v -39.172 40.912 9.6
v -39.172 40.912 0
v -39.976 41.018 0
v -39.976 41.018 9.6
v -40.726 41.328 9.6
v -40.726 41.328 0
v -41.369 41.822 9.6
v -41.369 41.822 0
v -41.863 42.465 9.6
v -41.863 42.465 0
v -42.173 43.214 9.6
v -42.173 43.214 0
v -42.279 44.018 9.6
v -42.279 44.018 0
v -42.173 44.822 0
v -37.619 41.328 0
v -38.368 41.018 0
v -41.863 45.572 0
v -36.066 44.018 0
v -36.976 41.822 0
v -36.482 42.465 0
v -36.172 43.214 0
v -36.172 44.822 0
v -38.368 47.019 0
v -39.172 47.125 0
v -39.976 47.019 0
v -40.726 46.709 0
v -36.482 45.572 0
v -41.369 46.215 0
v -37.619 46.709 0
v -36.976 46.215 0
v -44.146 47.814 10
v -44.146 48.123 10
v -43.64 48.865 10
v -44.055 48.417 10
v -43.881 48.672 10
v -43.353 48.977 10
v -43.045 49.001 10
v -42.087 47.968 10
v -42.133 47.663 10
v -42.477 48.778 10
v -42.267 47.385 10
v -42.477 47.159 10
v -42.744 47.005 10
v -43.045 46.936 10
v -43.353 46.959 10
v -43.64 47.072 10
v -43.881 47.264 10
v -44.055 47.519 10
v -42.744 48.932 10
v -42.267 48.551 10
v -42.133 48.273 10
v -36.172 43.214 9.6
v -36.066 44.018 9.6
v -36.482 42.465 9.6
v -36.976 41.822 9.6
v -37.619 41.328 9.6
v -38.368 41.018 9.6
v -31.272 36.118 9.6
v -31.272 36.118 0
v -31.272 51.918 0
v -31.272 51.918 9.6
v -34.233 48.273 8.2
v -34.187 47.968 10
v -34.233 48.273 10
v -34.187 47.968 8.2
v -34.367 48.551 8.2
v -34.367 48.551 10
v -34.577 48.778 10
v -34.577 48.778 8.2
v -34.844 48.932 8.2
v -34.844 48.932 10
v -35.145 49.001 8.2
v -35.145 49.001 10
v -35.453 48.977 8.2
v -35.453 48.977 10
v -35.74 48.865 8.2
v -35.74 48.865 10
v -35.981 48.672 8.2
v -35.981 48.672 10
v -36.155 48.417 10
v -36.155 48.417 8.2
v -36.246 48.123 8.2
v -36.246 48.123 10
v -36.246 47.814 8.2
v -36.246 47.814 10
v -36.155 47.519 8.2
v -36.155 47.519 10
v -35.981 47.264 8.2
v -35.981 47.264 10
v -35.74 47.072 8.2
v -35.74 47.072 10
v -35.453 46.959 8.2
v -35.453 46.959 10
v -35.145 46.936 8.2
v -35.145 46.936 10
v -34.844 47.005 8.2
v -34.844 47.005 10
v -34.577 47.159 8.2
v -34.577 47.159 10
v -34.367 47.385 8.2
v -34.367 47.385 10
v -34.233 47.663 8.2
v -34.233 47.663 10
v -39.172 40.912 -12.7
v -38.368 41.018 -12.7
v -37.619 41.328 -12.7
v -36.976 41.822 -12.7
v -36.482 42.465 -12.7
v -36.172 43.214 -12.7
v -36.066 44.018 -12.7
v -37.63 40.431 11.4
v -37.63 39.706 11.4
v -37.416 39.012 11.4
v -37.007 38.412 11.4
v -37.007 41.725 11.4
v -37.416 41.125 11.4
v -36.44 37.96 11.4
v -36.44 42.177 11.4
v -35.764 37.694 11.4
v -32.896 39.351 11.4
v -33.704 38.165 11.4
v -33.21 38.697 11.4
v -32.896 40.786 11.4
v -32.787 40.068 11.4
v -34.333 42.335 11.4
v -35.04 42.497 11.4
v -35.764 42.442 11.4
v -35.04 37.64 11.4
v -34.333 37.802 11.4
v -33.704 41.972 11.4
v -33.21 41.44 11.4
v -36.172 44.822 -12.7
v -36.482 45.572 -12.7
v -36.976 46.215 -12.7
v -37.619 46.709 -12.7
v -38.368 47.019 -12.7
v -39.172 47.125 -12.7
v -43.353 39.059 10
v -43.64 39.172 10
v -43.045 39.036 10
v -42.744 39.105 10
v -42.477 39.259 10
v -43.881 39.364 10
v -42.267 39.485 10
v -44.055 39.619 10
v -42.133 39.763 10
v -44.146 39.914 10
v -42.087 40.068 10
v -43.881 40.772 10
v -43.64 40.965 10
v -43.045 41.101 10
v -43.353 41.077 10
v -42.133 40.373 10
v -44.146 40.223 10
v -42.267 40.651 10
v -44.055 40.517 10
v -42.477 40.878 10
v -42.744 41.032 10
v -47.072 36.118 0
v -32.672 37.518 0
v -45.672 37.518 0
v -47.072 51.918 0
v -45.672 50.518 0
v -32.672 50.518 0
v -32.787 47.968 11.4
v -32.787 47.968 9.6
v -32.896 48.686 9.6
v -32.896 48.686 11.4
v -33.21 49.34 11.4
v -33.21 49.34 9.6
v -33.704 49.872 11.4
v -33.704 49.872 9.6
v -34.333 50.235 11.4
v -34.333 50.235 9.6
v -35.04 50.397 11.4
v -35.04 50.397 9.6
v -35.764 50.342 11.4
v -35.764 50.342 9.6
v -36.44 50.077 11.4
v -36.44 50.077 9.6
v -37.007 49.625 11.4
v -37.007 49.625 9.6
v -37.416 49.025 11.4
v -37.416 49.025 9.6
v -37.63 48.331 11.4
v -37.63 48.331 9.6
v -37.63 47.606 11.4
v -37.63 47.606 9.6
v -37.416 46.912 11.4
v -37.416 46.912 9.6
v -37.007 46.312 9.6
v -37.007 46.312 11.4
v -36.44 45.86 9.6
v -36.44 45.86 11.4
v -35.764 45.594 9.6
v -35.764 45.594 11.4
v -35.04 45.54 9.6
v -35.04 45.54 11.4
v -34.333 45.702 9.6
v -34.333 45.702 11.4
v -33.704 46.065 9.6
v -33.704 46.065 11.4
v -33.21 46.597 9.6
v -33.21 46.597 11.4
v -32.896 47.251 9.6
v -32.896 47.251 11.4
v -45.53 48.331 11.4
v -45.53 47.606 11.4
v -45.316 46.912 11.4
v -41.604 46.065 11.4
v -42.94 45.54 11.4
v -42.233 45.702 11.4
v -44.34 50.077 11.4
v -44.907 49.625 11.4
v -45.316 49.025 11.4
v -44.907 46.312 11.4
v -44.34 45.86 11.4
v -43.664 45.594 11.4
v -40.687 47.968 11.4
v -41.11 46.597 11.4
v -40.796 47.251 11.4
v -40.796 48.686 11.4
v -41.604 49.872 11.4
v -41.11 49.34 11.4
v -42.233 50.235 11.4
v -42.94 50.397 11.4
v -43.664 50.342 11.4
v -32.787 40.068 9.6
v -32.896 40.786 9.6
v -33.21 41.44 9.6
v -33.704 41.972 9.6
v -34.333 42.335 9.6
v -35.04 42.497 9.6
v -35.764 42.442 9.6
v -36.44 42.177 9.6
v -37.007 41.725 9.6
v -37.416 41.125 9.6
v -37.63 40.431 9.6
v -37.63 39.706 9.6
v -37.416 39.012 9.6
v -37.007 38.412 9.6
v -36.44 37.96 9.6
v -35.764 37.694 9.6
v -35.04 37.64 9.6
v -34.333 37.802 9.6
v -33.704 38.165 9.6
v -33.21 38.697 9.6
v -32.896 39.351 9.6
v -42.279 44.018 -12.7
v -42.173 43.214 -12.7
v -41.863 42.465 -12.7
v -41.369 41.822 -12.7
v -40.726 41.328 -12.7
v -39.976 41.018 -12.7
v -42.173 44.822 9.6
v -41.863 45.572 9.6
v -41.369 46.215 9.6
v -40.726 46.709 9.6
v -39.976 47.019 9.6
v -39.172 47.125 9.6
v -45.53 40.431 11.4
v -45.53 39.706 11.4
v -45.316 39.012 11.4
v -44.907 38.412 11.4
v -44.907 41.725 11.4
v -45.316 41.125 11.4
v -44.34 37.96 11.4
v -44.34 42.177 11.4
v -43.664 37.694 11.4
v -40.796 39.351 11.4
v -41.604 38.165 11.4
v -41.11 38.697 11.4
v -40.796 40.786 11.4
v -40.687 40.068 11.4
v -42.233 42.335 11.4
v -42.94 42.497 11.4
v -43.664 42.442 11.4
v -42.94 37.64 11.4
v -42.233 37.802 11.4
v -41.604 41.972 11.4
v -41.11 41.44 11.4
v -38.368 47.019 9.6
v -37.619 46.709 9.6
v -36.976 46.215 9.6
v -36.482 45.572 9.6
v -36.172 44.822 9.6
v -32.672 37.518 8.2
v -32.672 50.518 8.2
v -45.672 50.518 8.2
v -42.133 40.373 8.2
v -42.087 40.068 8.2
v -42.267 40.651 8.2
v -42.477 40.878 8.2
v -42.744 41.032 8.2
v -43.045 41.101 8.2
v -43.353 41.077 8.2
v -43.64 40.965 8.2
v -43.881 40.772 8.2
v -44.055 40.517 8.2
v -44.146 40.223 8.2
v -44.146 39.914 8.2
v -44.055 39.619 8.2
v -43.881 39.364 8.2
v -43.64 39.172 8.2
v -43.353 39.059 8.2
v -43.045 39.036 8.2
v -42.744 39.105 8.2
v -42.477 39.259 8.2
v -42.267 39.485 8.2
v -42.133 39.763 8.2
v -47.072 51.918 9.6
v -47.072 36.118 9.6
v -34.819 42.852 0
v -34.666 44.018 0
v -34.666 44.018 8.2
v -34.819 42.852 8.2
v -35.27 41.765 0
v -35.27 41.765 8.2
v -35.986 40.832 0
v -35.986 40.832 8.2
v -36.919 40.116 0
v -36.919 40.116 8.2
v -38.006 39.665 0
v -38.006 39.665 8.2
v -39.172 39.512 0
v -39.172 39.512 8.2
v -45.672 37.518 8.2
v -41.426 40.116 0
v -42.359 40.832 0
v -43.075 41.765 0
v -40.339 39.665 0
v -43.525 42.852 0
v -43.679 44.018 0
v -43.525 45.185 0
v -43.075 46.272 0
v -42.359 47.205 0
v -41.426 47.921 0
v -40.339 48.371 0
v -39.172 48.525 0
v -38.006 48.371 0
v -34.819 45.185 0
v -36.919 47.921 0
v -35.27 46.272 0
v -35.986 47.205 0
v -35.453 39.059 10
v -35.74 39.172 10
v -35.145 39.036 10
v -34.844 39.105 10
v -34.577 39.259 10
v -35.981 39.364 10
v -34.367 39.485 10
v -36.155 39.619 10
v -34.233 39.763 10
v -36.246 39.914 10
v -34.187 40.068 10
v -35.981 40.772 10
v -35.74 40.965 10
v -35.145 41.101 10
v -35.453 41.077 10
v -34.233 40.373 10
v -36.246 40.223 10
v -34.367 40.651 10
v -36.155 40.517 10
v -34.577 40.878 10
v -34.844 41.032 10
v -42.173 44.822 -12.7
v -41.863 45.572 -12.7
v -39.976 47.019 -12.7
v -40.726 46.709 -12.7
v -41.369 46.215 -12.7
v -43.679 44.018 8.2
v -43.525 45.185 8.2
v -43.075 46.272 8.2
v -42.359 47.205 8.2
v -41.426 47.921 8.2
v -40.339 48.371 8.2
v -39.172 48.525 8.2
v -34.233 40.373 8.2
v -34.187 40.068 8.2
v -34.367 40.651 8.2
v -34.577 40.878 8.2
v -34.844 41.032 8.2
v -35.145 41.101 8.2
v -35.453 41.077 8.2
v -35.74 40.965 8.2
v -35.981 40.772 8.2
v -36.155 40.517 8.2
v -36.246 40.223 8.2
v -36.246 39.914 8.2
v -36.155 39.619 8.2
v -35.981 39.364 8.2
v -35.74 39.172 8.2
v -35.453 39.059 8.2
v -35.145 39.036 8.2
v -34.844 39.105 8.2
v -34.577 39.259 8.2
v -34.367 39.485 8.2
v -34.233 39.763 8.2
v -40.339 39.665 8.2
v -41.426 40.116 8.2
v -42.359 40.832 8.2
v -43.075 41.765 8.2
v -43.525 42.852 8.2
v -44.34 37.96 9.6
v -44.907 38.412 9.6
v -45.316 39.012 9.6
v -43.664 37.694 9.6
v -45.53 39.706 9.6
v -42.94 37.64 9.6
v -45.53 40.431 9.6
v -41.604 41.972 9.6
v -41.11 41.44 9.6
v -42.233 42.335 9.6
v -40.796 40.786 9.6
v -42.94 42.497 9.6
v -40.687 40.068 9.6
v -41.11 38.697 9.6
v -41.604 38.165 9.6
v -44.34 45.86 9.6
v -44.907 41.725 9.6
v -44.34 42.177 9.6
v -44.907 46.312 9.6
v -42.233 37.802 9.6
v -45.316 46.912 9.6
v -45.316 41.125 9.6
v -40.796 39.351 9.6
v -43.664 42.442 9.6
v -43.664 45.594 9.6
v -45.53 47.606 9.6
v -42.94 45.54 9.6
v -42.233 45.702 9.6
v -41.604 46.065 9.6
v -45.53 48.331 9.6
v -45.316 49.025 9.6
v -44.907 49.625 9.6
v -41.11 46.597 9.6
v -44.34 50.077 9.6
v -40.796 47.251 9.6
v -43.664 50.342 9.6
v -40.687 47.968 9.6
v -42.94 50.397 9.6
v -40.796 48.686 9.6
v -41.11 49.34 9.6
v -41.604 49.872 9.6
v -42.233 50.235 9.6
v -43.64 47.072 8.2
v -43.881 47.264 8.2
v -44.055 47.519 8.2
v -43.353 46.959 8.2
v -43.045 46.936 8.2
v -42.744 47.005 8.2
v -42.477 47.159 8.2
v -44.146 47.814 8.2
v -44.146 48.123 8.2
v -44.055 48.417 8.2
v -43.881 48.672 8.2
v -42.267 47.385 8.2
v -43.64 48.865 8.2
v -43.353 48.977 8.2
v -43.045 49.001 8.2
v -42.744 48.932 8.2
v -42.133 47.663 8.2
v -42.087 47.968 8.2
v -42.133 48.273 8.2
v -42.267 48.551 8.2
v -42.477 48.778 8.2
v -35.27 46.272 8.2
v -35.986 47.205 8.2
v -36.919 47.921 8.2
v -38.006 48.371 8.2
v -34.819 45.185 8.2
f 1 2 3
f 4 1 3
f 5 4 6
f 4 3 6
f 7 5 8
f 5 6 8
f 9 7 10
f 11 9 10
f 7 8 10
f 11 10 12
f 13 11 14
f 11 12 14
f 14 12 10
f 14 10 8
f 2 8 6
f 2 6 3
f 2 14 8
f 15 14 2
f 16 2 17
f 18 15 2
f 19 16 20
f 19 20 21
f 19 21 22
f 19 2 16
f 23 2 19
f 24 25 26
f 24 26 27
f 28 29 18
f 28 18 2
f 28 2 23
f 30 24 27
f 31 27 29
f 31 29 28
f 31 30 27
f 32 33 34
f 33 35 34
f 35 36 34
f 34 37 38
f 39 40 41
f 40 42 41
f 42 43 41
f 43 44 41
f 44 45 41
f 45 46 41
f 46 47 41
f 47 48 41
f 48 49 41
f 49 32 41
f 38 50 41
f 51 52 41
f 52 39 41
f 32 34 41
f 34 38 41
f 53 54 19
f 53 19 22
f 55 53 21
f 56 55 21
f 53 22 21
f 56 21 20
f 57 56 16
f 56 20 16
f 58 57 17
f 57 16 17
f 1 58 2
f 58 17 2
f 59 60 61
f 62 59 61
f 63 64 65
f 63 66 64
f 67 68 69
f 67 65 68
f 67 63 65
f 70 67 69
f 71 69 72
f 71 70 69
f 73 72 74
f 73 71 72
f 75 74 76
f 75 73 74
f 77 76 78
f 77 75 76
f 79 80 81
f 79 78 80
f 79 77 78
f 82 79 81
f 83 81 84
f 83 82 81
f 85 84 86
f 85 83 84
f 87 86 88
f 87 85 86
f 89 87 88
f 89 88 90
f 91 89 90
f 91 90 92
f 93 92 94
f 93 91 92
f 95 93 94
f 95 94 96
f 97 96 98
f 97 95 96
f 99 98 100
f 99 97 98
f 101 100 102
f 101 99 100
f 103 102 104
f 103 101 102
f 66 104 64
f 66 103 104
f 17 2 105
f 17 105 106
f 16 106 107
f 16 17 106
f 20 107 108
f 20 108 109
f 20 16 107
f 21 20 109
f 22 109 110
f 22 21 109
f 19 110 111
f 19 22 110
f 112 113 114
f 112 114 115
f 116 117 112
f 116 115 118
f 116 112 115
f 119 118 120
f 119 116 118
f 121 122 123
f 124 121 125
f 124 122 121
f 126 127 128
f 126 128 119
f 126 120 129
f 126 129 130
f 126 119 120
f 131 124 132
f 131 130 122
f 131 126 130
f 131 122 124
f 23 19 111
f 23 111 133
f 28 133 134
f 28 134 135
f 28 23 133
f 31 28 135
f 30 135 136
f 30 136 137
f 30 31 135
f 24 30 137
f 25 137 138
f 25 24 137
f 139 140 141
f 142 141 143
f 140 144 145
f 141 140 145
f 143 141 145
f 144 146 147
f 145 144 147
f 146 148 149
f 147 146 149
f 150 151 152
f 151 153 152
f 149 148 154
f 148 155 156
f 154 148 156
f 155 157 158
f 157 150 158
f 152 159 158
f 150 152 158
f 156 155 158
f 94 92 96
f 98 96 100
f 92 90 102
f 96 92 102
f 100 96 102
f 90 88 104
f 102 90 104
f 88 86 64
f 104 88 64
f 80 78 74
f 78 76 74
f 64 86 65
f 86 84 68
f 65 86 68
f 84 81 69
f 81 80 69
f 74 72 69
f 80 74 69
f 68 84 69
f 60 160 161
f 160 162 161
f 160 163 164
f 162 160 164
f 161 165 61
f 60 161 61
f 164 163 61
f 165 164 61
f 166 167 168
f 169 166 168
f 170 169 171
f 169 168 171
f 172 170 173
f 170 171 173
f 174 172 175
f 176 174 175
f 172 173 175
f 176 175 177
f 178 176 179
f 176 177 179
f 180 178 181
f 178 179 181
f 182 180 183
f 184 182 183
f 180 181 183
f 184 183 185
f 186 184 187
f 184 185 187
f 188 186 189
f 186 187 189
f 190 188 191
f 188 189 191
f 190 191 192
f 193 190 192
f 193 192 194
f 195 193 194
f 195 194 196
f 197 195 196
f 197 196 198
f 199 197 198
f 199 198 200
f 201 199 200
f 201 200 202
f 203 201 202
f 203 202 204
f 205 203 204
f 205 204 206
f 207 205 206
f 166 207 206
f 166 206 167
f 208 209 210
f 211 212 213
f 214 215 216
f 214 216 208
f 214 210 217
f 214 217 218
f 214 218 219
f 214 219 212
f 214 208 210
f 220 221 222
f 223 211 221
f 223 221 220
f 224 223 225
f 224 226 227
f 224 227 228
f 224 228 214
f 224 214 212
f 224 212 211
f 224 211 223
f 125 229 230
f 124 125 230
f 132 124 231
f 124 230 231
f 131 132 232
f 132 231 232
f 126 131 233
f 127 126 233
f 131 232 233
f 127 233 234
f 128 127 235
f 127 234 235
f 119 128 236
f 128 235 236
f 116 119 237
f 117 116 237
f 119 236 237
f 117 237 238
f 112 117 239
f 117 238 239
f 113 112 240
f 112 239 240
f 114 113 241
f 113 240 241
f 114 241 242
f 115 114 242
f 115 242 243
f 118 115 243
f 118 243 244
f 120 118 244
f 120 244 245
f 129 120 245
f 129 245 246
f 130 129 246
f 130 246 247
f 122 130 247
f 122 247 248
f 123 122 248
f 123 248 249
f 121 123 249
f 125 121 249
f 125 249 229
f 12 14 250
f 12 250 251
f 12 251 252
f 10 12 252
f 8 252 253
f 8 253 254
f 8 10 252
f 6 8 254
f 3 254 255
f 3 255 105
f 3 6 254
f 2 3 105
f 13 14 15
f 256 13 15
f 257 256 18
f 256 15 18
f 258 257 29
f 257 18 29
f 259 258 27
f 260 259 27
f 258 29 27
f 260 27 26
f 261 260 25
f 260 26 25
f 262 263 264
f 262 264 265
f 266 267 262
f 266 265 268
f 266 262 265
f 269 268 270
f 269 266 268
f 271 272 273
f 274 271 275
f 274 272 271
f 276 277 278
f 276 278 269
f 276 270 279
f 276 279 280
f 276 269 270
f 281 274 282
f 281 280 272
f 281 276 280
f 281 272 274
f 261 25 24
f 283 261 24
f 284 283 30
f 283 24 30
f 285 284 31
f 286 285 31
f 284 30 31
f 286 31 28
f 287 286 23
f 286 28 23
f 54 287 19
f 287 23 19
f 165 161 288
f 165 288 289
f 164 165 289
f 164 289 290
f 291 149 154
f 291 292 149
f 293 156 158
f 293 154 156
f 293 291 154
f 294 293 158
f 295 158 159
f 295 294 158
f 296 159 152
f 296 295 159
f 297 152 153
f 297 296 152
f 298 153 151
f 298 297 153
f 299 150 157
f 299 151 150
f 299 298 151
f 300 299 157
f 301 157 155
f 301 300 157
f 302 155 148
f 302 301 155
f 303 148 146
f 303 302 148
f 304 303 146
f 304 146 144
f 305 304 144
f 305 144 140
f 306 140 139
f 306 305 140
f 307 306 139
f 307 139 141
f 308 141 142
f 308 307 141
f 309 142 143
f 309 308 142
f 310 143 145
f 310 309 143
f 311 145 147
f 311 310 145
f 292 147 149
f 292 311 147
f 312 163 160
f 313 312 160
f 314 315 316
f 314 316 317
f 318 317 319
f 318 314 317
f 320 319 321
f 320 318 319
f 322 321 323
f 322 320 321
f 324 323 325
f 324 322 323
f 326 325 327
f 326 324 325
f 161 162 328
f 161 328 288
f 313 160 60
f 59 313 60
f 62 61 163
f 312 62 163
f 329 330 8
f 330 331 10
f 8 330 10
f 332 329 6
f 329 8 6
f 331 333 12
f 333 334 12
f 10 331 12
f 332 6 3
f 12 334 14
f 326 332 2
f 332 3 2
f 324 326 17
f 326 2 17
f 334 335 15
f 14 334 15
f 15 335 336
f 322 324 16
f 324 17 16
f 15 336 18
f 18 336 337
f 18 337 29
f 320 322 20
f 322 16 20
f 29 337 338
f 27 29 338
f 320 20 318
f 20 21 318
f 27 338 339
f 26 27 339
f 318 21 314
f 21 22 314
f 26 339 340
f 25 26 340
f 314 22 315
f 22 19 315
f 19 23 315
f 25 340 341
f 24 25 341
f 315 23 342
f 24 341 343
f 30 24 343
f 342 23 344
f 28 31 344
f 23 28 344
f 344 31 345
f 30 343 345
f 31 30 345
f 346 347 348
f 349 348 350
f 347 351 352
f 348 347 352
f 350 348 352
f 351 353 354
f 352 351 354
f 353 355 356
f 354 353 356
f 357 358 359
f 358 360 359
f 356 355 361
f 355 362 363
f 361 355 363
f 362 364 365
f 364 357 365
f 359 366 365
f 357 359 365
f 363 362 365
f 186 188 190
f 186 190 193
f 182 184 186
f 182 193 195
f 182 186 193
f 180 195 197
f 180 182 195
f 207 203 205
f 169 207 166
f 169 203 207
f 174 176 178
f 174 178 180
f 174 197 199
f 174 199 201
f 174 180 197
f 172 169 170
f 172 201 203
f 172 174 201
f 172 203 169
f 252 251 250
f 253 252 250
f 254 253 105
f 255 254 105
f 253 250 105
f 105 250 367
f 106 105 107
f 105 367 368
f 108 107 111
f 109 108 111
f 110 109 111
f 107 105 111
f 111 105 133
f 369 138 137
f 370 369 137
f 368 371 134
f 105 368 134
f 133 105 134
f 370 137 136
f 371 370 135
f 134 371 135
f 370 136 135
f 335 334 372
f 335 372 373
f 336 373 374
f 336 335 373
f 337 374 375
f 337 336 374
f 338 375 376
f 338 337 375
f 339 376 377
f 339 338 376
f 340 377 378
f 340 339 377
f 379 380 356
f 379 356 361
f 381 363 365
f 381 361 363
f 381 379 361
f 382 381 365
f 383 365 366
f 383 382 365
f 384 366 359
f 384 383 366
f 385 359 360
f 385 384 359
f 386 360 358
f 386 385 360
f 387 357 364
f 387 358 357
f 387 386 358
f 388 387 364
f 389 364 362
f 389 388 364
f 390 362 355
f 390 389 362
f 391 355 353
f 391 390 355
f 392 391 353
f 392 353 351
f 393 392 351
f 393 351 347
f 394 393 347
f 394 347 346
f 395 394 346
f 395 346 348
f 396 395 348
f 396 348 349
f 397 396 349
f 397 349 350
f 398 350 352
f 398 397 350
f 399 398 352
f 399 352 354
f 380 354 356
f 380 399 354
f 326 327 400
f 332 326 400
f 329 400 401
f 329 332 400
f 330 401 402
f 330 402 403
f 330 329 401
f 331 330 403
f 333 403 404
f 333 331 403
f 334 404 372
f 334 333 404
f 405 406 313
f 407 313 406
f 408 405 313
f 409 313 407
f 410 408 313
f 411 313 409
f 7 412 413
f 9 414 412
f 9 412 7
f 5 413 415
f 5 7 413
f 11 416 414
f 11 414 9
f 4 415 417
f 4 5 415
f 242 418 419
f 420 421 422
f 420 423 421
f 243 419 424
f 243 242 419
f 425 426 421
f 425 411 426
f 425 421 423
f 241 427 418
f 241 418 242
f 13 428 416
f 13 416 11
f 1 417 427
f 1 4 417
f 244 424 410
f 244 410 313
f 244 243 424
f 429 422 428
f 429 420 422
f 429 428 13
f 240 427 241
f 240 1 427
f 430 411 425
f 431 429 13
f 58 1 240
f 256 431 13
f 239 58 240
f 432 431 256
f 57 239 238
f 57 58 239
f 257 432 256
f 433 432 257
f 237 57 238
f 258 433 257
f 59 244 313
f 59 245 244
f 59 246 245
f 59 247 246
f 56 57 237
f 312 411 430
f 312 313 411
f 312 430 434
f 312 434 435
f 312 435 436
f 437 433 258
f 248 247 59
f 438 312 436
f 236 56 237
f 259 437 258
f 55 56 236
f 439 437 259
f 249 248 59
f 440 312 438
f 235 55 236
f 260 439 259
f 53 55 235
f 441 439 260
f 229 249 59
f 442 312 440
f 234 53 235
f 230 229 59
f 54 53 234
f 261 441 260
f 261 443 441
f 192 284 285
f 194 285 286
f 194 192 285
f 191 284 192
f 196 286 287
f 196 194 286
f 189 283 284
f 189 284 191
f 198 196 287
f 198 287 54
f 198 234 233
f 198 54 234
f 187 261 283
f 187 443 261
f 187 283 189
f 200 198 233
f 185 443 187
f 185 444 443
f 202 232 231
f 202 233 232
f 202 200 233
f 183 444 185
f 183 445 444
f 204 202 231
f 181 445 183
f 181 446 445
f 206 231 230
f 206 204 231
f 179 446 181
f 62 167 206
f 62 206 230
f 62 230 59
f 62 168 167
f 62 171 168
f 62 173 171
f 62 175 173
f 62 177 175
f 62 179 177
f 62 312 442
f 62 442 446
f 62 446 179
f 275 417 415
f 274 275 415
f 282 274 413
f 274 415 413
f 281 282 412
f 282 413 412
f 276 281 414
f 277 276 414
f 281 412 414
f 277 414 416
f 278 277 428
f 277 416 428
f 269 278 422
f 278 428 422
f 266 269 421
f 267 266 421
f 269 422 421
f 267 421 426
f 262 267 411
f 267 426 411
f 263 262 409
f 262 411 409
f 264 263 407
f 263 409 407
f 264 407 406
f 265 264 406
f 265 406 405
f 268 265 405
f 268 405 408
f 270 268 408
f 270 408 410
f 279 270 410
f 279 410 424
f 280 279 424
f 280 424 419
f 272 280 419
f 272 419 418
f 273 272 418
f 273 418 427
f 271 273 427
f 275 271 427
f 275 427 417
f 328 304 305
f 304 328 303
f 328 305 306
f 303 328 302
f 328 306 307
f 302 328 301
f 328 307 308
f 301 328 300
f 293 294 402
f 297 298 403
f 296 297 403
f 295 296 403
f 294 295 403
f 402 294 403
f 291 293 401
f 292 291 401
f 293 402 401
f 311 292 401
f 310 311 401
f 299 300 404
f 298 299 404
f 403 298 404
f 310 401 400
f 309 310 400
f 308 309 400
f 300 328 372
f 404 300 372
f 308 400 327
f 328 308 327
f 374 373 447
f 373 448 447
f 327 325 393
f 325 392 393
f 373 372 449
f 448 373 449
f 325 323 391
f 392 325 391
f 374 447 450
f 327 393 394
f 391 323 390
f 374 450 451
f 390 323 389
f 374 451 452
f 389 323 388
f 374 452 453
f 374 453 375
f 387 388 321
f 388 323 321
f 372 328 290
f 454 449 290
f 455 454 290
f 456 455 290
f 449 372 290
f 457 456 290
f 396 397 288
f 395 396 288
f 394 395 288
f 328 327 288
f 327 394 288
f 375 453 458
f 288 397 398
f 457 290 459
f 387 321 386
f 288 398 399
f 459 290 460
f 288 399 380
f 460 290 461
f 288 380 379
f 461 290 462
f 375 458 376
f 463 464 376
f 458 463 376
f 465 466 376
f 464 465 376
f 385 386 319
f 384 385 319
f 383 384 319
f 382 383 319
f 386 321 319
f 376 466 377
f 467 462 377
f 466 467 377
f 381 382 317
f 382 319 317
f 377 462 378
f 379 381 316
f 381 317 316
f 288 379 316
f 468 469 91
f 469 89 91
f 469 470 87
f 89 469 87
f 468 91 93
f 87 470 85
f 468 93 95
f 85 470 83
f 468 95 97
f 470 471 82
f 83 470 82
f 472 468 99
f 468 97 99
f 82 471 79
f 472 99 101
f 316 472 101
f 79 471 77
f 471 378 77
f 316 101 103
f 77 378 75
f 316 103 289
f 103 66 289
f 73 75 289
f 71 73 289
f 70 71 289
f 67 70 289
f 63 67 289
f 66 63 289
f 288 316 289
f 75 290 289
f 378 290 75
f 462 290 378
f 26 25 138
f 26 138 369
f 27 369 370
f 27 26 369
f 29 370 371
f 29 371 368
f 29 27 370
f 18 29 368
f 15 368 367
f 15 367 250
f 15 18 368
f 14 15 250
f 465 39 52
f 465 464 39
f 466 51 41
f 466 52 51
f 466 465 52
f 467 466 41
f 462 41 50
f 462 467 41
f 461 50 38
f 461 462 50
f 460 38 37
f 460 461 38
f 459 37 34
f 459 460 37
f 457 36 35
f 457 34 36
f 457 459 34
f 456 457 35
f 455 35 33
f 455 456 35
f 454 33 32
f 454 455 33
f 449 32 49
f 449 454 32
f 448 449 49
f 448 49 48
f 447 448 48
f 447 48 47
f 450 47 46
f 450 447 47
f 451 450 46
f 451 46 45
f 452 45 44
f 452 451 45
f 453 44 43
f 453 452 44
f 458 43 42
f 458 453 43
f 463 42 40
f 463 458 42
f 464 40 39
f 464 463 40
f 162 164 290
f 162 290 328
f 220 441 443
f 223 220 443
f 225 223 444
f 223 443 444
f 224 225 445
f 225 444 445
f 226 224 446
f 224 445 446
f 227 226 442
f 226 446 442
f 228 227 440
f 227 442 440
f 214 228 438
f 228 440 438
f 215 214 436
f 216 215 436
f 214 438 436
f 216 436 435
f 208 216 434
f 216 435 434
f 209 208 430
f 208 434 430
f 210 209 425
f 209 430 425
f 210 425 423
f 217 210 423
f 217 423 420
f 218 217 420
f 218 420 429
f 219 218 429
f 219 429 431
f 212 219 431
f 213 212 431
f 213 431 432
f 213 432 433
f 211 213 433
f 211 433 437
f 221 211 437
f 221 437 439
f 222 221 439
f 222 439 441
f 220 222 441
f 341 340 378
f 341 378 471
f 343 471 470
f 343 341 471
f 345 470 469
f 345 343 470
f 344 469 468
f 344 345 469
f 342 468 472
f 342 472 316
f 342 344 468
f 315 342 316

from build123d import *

# Parameters (mm, degrees)
F0_R     = 2.435
F1_DEPTH = 9.6
F2_DEPTH = 11.4
F3_T     = -1.4
F4_DEPTH = 12.7


with BuildPart() as f1:
    # F0 (on Top) → F1 (new body)
    with BuildSketch(Plane.XY):
        with BuildLine():
            Line((-47.0723696053, 44.0184217036), (-47.0723696053, 36.1184217036))
            Line((-47.0723696053, 36.1184217036), (-39.1723696053, 36.1184217036))
            Line((-39.1723696053, 36.1184217036), (-39.1723696053, 40.9119217036))
            ThreePointArc((-39.1723696053, 40.9119217036), (-41.3689968211, 41.8217944878), (-42.2788696053, 44.0184217036))
            Line((-42.2788696053, 44.0184217036), (-47.0723696053, 44.0184217036))
        make_face()
        with Locations((-43.1223696053, 40.0684217036)):
            Circle(F0_R, mode=Mode.SUBTRACT)
        with BuildLine():
            Line((-39.1723696053, 40.9119217036), (-39.1723696053, 36.1184217036))
            Line((-39.1723696053, 36.1184217036), (-31.2723696053, 36.1184217036))
            Line((-31.2723696053, 36.1184217036), (-31.2723696053, 44.0184217036))
            Line((-31.2723696053, 44.0184217036), (-36.0658696053, 44.0184217036))
            ThreePointArc((-36.0658696053, 44.0184217036), (-36.9757423895, 41.8217944878), (-39.1723696053, 40.9119217036))
        make_face()
        with Locations((-35.2223696053, 40.0684217036)):
            Circle(F0_R, mode=Mode.SUBTRACT)
        with BuildLine():
            Line((-47.0723696053, 51.9184217036), (-47.0723696053, 44.0184217036))
            Line((-47.0723696053, 44.0184217036), (-42.2788696053, 44.0184217036))
            ThreePointArc((-42.2788696053, 44.0184217036), (-41.3689968211, 46.2150489193), (-39.1723696053, 47.1249217036))
            Line((-39.1723696053, 47.1249217036), (-39.1723696053, 51.9184217036))
            Line((-39.1723696053, 51.9184217036), (-47.0723696053, 51.9184217036))
        make_face()
        with BuildLine():
            ThreePointArc((-45.5573696053, 47.9684217036), (-43.1223696053, 50.4034217036), (-40.6873696053, 47.9684217036))
            ThreePointArc((-40.6873696053, 47.9684217036), (-43.1223696053, 45.5334217036), (-45.5573696053, 47.9684217036))
        make_face(mode=Mode.SUBTRACT)
        with BuildLine():
            Line((-36.0658696053, 44.0184217036), (-31.2723696053, 44.0184217036))
            Line((-31.2723696053, 44.0184217036), (-31.2723696053, 51.9184217036))
            Line((-31.2723696053, 51.9184217036), (-39.1723696053, 51.9184217036))
            Line((-39.1723696053, 51.9184217036), (-39.1723696053, 47.1249217036))
            ThreePointArc((-39.1723696053, 47.1249217036), (-36.9757423895, 46.2150489193), (-36.0658696053, 44.0184217036))
        make_face()
        with Locations((-35.2223696053, 47.9684217036)):
            Circle(F0_R, mode=Mode.SUBTRACT)
    extrude(amount=F1_DEPTH)

    # F0 (on Top) → F2 (join)
    with BuildSketch(Plane.XY):
        with Locations((-35.2223696053, 40.0684217036)):
            Circle(F0_R)
        with Locations((-35.2223696053, 47.9684217036)):
            Circle(F0_R)
        with BuildLine():
            ThreePointArc((-45.5573696053, 47.9684217036), (-43.1223696053, 45.5334217036), (-40.6873696053, 47.9684217036))
            ThreePointArc((-40.6873696053, 47.9684217036), (-43.1223696053, 50.4034217036), (-45.5573696053, 47.9684217036))
        make_face()
        with Locations((-43.1223696053, 40.0684217036)):
            Circle(F0_R)
    extrude(amount=F2_DEPTH)

    # F3
    f3_openings = [f1.faces().sort_by_distance(p)[0] for p in [
        (-39.17237, 36.341867, 0),
    ]]
    offset(amount=F3_T, openings=f3_openings, kind=Kind.INTERSECTION)


with BuildPart() as f4:
    # F0 (on Top) → F4 (new body)
    with BuildSketch(Plane.XY):
        with BuildLine():
            ThreePointArc((-41.9788695872, 44.0184217036), (-41.1568647739, 42.033926535), (-39.1723696053, 41.2119217217))
            Line((-39.1723696053, 41.2119217217), (-39.1723696053, 44.0184217036))
            Line((-39.1723696053, 44.0184217036), (-41.9788695872, 44.0184217036))
        make_face()
        with BuildLine():
            ThreePointArc((-39.1723696053, 46.8249216855), (-41.1568647739, 46.0029168722), (-41.9788695872, 44.0184217036))
            Line((-41.9788695872, 44.0184217036), (-39.1723696053, 44.0184217036))
            Line((-39.1723696053, 44.0184217036), (-39.1723696053, 46.8249216855))
        make_face()
        with BuildLine():
            Line((-39.1723696053, 46.8249216855), (-39.1723696053, 44.0184217036))
            Line((-39.1723696053, 44.0184217036), (-36.3658696234, 44.0184217036))
            ThreePointArc((-36.3658696234, 44.0184217036), (-37.1878744367, 46.0029168722), (-39.1723696053, 46.8249216855))
        make_face()
        with BuildLine():
            Line((-39.1723696053, 44.0184217036), (-39.1723696053, 41.2119217217))
            ThreePointArc((-39.1723696053, 41.2119217217), (-37.1878744367, 42.033926535), (-36.3658696234, 44.0184217036))
            Line((-36.3658696234, 44.0184217036), (-39.1723696053, 44.0184217036))
        make_face()
        with BuildLine():
            ThreePointArc((-39.1723696053, 47.1249217036), (-41.3689968211, 46.2150489193), (-42.2788696053, 44.0184217036))
            Line((-42.2788696053, 44.0184217036), (-41.9788695872, 44.0184217036))
            ThreePointArc((-41.9788695872, 44.0184217036), (-41.1568647739, 46.0029168722), (-39.1723696053, 46.8249216855))
            Line((-39.1723696053, 46.8249216855), (-39.1723696053, 47.1249217036))
        make_face()
        with BuildLine():
            Line((-36.3658696234, 44.0184217036), (-36.0658696053, 44.0184217036))
            ThreePointArc((-36.0658696053, 44.0184217036), (-36.9757423895, 46.2150489193), (-39.1723696053, 47.1249217036))
            Line((-39.1723696053, 47.1249217036), (-39.1723696053, 46.8249216855))
            ThreePointArc((-39.1723696053, 46.8249216855), (-37.1878744367, 46.0029168722), (-36.3658696234, 44.0184217036))
        make_face()
        with BuildLine():
            Line((-39.1723696053, 41.2119217217), (-39.1723696053, 40.9119217036))
            ThreePointArc((-39.1723696053, 40.9119217036), (-36.9757423895, 41.8217944878), (-36.0658696053, 44.0184217036))
            Line((-36.0658696053, 44.0184217036), (-36.3658696234, 44.0184217036))
            ThreePointArc((-36.3658696234, 44.0184217036), (-37.1878744367, 42.033926535), (-39.1723696053, 41.2119217217))
        make_face()
        with BuildLine():
            ThreePointArc((-42.2788696053, 44.0184217036), (-41.3689968211, 41.8217944878), (-39.1723696053, 40.9119217036))
            Line((-39.1723696053, 40.9119217036), (-39.1723696053, 41.2119217217))
            ThreePointArc((-39.1723696053, 41.2119217217), (-41.1568647739, 42.033926535), (-41.9788695872, 44.0184217036))
            Line((-41.9788695872, 44.0184217036), (-42.2788696053, 44.0184217036))
        make_face()
    extrude(amount=-F4_DEPTH)


solid = Compound([f1.part, f4.part])
